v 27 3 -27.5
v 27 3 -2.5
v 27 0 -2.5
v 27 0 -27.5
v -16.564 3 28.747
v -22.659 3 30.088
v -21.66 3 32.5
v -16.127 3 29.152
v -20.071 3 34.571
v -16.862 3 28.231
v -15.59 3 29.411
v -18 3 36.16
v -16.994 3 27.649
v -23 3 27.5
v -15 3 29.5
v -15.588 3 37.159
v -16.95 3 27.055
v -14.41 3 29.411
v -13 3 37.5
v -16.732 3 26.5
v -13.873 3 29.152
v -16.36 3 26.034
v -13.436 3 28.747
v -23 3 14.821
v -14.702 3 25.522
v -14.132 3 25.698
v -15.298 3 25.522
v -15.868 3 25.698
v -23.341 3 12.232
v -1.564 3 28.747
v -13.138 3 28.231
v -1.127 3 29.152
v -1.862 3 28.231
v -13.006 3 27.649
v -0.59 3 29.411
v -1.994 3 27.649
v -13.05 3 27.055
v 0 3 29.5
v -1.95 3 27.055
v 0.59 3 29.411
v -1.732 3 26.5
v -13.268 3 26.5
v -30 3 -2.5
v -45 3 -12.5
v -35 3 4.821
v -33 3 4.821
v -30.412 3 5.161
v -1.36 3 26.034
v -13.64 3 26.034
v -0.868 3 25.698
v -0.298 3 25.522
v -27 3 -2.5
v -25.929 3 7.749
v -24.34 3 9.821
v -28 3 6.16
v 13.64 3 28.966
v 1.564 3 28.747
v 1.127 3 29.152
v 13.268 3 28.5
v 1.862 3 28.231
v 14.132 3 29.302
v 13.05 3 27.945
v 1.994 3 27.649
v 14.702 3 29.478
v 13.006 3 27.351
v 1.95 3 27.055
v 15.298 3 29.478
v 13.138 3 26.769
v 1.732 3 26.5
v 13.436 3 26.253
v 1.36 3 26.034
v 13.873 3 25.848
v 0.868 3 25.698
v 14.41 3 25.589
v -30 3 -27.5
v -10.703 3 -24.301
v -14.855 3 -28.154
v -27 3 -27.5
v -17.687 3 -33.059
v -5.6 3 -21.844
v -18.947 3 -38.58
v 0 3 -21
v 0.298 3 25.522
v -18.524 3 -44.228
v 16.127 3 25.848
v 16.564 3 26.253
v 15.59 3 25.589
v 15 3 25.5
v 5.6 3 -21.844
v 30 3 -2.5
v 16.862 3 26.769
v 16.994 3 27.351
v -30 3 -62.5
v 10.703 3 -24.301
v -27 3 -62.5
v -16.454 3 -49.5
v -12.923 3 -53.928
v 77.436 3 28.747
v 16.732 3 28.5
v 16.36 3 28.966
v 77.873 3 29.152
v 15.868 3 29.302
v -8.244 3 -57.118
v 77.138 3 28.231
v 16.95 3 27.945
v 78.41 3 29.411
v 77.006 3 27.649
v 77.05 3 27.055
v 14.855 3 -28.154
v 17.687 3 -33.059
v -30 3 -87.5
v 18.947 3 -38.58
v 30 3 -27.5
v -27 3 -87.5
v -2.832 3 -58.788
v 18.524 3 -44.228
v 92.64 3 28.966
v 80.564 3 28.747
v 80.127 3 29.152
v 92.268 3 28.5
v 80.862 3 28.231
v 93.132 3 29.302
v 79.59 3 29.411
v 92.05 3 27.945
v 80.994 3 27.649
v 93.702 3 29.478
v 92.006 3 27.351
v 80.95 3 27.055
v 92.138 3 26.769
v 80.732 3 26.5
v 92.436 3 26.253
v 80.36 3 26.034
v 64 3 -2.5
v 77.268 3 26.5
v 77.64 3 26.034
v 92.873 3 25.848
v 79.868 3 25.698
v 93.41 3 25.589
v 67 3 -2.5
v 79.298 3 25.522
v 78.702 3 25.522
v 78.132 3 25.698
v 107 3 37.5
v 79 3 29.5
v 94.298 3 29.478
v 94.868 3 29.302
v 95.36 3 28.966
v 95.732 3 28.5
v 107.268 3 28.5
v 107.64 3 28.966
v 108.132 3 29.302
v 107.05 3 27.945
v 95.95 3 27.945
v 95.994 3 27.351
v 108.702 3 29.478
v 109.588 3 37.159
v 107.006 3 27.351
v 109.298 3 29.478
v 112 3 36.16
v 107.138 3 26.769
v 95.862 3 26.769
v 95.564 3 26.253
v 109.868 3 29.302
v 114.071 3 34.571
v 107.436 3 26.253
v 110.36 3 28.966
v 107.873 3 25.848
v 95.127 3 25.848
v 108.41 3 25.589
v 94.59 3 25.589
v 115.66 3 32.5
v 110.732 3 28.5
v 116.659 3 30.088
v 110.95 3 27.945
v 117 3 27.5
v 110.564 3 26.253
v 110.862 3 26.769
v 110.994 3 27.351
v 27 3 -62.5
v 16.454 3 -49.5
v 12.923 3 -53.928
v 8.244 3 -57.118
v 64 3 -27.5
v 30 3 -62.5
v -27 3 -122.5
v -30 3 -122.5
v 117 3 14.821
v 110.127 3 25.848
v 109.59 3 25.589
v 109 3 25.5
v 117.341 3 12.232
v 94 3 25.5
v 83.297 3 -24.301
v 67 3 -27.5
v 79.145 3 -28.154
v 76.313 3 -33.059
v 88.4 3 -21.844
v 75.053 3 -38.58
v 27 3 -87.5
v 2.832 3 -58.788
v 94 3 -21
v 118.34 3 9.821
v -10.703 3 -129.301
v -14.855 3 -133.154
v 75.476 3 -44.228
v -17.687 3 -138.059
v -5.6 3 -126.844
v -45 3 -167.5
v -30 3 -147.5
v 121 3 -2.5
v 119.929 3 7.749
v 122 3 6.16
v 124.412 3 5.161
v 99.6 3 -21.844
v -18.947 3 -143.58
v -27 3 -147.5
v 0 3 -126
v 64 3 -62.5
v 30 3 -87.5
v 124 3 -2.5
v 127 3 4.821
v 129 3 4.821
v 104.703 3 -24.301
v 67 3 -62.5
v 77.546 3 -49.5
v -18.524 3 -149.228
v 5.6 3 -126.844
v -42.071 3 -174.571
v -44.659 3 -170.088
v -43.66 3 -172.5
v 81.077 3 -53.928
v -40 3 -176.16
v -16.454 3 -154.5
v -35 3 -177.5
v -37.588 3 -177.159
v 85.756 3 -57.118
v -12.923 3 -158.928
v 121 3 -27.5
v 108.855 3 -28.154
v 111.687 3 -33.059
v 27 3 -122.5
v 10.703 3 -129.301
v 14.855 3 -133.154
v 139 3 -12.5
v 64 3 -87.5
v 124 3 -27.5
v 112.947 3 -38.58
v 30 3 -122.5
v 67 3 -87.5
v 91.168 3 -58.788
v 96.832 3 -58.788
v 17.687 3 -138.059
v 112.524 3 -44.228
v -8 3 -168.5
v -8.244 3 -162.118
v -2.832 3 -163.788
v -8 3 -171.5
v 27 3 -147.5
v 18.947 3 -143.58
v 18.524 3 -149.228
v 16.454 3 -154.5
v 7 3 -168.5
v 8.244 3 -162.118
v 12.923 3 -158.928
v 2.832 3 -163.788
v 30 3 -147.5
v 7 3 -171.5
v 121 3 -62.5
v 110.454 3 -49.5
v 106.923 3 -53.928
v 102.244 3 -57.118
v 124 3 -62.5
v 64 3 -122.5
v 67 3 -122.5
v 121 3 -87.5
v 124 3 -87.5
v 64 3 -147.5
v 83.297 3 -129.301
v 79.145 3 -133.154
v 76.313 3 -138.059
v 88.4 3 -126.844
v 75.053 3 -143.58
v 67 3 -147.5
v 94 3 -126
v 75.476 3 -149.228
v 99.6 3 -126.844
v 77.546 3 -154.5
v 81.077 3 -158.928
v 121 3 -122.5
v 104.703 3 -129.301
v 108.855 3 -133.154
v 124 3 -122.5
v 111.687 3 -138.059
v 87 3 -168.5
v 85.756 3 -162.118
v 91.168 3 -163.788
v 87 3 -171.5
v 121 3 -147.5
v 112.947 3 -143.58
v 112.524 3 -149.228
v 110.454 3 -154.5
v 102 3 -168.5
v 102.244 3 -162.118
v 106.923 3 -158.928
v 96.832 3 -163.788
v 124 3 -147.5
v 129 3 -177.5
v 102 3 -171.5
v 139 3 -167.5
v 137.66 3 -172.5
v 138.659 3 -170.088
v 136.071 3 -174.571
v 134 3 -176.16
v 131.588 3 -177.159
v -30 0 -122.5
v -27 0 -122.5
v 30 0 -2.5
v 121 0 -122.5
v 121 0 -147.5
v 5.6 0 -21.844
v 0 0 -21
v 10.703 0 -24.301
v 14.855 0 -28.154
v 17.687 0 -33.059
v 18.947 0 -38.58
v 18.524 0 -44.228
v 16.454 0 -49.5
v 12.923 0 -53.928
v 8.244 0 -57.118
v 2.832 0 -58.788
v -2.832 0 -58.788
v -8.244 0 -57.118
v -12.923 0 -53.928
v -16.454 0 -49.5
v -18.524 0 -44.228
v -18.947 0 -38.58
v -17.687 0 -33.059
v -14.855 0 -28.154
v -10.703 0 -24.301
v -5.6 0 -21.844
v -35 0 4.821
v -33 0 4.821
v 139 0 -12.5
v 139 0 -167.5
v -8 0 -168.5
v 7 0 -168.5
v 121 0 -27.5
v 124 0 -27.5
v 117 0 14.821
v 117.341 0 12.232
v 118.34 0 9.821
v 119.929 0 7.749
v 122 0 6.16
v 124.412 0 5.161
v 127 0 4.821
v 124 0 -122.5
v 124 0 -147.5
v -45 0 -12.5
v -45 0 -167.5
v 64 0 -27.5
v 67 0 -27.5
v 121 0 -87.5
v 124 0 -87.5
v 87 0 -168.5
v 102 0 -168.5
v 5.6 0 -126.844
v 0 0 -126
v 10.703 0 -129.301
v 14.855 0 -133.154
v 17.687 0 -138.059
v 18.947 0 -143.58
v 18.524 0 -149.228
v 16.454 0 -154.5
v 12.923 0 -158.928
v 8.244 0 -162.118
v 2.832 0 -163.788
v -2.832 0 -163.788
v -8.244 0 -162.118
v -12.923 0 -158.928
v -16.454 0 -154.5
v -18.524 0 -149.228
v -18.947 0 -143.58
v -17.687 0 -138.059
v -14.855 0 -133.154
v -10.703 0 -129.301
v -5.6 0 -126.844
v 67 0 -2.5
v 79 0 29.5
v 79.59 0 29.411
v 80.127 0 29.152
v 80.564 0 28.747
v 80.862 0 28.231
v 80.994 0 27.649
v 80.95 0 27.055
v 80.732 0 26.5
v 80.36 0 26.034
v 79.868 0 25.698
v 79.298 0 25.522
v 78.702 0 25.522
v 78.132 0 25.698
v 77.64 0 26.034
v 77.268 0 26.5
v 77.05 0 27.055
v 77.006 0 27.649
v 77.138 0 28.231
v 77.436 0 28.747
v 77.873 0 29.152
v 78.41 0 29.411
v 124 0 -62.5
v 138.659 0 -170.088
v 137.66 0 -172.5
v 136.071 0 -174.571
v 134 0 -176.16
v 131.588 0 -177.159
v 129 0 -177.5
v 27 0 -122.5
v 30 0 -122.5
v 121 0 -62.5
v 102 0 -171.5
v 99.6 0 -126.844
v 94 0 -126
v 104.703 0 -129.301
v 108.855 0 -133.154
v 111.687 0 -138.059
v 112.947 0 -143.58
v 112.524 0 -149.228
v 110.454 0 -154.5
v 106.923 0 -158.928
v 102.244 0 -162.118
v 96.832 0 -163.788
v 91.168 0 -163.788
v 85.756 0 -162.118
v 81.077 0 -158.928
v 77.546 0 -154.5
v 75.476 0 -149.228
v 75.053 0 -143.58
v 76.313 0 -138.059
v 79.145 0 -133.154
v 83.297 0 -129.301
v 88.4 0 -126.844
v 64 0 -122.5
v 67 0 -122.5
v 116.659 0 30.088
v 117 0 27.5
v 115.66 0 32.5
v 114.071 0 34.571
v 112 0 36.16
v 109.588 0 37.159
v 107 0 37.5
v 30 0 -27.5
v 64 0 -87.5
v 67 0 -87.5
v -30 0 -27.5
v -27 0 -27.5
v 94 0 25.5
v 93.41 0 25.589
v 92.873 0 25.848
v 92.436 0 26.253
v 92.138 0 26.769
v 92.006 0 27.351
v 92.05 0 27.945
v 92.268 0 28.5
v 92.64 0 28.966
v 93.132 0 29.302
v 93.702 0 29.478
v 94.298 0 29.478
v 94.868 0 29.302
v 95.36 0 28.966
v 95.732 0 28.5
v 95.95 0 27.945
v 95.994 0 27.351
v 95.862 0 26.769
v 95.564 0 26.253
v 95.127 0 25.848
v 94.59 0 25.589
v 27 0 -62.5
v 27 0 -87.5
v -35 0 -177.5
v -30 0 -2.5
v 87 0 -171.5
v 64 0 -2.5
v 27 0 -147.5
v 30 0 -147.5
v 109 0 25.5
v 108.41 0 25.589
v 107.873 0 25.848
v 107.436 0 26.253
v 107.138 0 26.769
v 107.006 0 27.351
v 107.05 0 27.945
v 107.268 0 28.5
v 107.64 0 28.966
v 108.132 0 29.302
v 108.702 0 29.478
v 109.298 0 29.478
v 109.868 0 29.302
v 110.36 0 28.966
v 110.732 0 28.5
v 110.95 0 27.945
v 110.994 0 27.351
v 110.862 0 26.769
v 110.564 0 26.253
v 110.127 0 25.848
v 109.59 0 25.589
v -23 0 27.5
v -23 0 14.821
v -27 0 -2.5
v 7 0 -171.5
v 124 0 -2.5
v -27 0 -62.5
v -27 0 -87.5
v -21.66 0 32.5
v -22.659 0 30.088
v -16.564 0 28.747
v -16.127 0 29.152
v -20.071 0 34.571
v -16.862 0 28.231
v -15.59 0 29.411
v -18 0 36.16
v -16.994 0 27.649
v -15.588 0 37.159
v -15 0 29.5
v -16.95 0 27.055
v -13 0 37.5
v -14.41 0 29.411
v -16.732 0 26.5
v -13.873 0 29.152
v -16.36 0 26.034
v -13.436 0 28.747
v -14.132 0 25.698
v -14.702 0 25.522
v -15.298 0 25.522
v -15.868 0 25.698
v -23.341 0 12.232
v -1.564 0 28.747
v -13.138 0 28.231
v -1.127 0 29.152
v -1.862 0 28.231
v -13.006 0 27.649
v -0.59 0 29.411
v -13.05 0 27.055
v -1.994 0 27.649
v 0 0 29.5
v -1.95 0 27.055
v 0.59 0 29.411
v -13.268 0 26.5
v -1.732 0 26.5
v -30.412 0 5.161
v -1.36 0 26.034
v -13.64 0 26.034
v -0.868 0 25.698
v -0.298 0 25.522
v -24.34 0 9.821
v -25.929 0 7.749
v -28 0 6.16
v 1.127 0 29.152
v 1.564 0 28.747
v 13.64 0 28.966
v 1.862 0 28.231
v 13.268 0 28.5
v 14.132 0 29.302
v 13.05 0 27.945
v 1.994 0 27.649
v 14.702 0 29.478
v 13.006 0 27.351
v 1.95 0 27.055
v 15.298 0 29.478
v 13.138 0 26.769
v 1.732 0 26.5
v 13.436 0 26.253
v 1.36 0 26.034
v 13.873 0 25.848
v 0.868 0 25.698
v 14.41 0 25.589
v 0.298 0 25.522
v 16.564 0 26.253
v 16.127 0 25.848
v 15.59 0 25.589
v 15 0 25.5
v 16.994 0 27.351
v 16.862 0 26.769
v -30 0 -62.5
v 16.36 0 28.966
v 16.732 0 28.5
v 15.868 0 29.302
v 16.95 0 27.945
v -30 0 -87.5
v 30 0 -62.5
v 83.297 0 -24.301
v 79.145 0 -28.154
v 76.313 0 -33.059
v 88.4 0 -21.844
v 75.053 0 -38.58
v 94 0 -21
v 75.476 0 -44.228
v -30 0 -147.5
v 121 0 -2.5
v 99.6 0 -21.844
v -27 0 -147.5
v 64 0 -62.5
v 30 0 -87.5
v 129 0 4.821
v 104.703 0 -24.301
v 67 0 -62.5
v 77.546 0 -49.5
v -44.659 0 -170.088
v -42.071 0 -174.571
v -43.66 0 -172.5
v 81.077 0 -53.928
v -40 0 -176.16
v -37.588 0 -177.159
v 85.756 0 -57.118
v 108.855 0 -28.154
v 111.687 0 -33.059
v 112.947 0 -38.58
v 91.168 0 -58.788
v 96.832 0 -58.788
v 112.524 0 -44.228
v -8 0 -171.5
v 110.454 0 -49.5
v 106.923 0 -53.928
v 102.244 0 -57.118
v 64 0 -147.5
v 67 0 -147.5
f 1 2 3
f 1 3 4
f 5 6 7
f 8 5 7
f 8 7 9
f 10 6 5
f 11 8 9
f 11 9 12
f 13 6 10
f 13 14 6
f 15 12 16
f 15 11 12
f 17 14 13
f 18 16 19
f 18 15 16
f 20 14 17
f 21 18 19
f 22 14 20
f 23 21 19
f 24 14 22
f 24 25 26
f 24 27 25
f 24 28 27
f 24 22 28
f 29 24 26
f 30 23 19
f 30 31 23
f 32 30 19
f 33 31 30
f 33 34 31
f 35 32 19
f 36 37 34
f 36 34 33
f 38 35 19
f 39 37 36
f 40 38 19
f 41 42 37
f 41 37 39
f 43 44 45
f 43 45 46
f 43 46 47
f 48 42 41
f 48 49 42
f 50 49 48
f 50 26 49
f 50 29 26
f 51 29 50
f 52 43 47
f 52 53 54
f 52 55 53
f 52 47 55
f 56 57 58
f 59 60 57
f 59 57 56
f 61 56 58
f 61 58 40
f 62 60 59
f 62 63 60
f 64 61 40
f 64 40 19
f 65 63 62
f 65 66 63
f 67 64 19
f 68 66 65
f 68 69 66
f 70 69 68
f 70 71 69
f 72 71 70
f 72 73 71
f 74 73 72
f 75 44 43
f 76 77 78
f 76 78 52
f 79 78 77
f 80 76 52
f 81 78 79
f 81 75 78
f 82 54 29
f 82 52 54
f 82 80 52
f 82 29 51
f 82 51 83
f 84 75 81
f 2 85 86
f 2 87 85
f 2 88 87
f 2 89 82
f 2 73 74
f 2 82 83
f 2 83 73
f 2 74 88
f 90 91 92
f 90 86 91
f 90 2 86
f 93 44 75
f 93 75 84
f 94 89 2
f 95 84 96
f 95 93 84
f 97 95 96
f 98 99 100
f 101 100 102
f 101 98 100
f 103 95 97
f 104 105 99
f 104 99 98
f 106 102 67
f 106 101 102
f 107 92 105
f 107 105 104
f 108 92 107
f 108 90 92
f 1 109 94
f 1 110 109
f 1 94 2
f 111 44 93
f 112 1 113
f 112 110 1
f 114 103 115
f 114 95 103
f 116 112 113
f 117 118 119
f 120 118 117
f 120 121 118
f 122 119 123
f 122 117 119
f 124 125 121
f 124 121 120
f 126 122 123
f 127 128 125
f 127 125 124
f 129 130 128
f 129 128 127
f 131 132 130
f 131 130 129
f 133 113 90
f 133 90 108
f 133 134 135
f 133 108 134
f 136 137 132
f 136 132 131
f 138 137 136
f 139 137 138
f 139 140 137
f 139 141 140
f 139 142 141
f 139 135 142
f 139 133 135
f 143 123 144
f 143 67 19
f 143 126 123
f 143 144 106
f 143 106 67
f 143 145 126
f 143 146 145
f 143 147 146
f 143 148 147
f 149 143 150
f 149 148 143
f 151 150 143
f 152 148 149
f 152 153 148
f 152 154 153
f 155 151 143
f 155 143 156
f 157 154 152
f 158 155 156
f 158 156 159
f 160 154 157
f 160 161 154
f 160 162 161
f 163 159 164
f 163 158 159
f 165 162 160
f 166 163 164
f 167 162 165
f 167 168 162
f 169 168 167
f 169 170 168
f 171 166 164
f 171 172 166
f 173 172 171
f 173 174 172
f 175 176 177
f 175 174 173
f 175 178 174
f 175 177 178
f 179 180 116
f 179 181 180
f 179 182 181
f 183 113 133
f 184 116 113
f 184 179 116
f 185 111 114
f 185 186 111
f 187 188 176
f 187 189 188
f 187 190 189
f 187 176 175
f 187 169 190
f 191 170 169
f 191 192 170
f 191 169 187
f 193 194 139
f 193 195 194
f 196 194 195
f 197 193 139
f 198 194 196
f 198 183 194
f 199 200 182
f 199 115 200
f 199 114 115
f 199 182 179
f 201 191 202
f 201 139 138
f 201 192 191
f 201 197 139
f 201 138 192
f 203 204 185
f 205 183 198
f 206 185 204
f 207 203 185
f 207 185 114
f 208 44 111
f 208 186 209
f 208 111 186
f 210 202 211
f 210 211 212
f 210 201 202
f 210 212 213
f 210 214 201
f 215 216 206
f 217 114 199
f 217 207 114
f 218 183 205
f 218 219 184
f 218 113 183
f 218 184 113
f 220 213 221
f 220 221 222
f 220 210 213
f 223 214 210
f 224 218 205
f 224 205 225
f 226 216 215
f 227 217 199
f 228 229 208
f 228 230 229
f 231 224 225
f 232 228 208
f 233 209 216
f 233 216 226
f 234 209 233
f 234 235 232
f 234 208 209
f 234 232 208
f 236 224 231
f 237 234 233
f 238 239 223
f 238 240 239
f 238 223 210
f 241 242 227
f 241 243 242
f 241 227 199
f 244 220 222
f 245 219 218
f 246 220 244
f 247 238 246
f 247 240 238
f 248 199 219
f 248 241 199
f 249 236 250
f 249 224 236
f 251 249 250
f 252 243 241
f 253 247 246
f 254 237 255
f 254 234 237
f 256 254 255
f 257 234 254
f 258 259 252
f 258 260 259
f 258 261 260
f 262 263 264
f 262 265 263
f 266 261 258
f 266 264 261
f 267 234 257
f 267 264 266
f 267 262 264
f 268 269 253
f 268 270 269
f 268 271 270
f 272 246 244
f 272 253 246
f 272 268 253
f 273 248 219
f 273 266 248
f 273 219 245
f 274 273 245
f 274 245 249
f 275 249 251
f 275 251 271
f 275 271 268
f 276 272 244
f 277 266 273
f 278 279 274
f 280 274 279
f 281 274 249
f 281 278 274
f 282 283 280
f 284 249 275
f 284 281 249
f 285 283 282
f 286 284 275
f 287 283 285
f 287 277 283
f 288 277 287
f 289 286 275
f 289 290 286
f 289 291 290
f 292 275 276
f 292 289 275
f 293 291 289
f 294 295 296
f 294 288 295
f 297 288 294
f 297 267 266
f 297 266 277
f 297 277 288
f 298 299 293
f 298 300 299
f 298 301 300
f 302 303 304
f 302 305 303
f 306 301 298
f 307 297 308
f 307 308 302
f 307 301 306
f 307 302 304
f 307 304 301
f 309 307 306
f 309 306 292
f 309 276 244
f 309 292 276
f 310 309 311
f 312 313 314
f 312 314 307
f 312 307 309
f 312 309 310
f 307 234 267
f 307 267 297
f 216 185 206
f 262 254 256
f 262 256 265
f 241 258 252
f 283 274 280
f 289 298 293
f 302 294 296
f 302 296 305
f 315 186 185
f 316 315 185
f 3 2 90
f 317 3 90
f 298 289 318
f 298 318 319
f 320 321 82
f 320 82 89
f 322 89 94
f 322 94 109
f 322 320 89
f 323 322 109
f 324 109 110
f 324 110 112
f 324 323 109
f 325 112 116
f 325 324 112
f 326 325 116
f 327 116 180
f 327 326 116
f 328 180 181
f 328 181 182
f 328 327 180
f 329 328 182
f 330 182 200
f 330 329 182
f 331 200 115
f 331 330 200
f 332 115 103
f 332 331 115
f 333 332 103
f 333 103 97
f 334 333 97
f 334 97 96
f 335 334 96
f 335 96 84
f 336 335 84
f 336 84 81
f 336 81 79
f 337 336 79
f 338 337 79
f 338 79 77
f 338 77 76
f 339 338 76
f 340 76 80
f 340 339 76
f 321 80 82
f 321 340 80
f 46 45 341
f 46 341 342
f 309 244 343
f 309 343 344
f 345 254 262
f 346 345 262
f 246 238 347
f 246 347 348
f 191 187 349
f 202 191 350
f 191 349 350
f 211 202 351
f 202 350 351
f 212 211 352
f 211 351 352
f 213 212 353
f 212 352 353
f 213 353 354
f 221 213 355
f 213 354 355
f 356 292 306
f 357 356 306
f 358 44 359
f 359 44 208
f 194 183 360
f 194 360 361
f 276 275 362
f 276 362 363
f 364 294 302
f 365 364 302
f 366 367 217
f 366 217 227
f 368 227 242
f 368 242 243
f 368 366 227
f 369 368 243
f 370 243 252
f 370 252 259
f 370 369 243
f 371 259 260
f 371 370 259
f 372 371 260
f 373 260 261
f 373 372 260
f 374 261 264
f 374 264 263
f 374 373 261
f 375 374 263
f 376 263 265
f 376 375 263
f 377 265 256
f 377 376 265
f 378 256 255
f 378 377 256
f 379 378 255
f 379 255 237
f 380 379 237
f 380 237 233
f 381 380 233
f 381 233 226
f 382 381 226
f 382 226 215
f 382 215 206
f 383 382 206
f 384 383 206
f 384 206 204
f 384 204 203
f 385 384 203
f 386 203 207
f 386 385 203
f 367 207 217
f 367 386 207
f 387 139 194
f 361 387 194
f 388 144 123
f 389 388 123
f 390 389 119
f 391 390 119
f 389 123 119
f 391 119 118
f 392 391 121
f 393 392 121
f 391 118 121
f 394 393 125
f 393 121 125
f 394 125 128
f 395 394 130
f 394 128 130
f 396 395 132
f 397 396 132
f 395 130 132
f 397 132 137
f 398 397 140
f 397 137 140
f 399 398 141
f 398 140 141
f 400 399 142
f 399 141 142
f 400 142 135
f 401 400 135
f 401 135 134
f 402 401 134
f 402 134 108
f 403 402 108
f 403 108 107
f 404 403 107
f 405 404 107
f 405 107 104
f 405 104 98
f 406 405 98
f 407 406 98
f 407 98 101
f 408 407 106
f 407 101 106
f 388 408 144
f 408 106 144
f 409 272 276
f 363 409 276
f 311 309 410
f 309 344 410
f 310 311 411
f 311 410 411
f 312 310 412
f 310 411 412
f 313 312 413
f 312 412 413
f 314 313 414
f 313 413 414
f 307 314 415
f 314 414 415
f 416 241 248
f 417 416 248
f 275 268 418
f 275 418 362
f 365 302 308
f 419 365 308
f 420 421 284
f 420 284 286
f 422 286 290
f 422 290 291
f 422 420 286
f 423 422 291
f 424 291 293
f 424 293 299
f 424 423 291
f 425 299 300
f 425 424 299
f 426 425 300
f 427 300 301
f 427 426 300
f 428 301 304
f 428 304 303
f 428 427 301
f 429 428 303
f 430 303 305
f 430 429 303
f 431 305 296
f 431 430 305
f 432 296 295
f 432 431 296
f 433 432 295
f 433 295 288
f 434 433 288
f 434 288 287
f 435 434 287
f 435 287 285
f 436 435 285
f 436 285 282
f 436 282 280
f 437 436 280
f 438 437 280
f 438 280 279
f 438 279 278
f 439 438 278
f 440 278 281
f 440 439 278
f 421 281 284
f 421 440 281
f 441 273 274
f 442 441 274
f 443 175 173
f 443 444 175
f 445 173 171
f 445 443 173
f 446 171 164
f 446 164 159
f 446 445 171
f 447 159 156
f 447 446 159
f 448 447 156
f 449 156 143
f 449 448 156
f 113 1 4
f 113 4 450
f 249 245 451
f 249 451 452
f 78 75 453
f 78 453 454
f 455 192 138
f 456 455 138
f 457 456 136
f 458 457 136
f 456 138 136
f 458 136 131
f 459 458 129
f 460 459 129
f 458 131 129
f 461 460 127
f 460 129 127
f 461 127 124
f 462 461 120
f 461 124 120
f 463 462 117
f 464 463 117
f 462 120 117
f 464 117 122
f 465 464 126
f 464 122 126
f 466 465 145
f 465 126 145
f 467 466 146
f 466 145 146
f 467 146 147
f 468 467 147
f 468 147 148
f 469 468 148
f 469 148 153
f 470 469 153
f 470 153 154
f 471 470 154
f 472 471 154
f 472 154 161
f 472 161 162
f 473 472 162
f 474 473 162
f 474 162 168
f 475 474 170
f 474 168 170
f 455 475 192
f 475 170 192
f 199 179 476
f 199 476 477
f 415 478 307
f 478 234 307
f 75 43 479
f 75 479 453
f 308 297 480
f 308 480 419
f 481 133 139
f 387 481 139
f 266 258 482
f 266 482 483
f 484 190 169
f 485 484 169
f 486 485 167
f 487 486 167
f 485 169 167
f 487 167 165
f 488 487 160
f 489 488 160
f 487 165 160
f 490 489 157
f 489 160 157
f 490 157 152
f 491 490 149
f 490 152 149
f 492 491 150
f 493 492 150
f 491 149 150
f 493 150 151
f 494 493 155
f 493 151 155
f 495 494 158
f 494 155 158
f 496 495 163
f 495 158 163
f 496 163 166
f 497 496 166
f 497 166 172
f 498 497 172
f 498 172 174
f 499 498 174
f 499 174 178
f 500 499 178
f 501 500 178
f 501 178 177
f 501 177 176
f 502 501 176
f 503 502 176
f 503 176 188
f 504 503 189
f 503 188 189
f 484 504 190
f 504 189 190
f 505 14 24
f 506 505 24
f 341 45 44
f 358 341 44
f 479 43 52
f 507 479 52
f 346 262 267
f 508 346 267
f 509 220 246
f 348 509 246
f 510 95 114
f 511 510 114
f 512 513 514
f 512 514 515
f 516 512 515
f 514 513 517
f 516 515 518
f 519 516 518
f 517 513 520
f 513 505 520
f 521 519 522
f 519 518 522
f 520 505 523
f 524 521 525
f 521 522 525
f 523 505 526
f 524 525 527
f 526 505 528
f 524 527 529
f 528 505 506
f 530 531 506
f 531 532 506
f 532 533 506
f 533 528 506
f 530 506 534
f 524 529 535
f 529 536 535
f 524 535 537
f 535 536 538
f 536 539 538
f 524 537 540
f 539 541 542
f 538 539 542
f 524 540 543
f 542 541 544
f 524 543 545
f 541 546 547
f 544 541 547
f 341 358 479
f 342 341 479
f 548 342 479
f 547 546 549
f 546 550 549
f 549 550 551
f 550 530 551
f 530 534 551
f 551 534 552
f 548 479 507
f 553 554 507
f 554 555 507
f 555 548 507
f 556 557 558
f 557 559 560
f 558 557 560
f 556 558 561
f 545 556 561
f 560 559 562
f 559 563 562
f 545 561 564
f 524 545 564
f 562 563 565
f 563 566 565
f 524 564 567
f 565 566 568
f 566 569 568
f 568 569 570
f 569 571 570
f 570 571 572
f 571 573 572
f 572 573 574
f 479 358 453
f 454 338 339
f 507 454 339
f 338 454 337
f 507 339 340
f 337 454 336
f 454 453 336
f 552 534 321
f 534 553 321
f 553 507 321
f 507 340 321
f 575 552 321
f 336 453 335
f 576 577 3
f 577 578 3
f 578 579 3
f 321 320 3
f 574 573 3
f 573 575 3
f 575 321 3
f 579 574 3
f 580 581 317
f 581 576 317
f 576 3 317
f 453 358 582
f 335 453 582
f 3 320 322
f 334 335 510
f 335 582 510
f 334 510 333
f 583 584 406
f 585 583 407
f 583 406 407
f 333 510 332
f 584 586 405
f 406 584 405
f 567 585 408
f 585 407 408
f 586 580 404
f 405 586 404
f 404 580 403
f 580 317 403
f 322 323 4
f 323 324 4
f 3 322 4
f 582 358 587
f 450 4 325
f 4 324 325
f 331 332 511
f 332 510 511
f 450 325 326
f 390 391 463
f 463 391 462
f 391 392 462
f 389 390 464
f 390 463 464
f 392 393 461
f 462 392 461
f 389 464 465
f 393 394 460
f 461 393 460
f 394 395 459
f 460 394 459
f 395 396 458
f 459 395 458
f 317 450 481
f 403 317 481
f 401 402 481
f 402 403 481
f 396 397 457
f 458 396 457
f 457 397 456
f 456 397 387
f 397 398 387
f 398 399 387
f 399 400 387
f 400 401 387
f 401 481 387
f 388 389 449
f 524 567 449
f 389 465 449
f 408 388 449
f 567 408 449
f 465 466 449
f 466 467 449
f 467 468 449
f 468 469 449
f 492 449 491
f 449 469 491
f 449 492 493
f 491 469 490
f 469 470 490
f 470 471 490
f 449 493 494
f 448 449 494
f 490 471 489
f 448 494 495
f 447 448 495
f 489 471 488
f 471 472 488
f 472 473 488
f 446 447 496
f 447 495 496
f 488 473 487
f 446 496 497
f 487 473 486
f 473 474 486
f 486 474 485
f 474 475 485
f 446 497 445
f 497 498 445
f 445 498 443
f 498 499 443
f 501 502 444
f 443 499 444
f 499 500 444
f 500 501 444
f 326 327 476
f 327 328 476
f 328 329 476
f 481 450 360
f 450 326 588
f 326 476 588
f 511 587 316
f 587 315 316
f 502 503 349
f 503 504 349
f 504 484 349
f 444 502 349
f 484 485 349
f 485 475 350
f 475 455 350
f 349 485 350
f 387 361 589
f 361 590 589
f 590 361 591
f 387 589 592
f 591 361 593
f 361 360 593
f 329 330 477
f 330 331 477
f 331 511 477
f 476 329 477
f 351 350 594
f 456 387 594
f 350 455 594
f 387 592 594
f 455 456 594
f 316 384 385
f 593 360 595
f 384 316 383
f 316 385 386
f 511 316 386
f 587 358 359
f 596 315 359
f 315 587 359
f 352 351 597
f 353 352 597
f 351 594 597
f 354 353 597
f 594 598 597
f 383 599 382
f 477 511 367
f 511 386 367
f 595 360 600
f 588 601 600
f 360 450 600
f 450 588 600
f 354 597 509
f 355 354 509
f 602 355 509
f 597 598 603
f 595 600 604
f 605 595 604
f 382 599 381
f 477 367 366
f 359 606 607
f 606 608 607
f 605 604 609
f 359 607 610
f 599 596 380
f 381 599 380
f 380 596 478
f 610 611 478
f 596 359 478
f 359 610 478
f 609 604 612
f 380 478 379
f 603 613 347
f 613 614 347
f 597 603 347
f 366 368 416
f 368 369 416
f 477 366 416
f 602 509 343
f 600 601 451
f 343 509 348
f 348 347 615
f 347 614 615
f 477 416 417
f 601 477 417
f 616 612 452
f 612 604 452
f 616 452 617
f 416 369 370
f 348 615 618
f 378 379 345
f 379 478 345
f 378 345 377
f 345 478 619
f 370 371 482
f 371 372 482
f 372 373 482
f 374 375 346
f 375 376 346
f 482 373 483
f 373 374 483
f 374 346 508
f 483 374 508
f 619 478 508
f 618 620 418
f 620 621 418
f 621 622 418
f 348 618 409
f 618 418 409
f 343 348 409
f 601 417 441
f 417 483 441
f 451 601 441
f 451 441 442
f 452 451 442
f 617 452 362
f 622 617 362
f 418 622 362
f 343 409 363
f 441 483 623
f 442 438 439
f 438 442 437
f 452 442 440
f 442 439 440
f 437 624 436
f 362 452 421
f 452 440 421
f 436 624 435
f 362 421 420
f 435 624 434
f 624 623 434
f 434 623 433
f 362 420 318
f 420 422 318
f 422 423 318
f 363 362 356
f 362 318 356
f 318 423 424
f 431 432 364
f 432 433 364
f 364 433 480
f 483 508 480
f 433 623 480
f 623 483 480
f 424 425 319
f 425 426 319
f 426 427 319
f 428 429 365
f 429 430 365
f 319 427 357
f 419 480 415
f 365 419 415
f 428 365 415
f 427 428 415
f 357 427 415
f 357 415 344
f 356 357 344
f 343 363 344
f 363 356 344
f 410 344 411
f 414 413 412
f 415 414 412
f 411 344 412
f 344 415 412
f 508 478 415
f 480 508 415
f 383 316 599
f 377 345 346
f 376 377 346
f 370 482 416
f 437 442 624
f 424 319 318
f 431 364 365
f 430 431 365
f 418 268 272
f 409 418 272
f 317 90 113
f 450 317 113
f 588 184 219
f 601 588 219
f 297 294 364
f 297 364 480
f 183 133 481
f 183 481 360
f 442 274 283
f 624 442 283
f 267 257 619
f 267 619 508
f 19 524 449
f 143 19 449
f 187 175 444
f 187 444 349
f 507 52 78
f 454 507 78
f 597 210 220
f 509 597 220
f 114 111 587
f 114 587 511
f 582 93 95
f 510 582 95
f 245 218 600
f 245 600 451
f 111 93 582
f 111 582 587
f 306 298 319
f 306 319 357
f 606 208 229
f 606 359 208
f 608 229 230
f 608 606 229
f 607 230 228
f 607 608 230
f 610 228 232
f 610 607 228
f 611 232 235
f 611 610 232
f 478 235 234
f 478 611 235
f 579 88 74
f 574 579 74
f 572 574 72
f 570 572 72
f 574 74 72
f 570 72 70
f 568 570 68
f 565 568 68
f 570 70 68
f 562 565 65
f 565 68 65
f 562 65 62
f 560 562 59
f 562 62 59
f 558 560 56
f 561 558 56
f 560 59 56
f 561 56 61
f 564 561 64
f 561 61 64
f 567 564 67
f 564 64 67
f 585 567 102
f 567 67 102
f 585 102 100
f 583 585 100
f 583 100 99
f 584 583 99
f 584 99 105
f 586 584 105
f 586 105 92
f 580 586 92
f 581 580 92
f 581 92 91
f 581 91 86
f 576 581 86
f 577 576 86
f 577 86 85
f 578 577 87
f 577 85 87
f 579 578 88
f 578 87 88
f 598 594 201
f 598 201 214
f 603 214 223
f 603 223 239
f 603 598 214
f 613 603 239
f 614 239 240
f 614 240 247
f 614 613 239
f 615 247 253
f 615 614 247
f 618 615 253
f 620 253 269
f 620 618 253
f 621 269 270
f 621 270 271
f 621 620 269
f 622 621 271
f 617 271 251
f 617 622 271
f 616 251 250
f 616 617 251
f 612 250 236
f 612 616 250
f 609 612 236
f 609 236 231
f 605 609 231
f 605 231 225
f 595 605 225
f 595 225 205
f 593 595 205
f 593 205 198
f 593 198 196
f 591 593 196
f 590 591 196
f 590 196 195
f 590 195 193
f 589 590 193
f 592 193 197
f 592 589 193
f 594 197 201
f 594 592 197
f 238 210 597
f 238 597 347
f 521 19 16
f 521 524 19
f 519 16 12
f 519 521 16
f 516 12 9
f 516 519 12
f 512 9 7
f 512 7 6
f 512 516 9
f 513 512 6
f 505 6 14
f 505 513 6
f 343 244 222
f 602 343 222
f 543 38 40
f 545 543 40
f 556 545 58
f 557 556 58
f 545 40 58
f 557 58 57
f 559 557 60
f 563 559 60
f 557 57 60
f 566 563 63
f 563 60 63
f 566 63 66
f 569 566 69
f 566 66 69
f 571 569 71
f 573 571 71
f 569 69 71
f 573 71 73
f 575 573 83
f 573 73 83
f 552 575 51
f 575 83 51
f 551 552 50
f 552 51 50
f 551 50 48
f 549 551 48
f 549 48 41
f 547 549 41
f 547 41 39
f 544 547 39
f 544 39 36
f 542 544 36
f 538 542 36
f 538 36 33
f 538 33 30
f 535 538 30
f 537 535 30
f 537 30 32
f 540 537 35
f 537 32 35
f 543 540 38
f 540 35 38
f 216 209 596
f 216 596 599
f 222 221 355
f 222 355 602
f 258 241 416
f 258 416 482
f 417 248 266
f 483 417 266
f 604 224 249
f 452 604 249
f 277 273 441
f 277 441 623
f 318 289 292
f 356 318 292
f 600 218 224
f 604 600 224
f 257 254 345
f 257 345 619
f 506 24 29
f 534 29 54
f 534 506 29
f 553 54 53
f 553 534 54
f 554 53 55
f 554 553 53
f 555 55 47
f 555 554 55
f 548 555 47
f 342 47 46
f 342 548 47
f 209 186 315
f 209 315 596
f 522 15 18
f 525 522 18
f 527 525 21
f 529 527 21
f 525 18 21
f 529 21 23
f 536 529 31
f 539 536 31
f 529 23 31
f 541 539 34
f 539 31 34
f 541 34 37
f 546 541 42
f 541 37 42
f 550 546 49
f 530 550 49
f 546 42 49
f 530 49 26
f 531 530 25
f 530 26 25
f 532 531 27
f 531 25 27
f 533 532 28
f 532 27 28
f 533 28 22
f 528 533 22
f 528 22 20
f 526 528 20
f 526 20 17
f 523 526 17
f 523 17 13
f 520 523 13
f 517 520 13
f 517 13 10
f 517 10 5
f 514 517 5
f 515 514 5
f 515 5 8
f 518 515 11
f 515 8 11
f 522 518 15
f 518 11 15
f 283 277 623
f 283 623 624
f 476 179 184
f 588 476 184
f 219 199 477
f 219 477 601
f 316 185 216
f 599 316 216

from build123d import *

# Parameters (mm, degrees)
SKETCH_1_W          = 164
SKETCH_1_H          = 215
SKETCH_1_R          = 19
EXTRUDE_1_DEPTH     = 3
SKETCH_2_R          = 2
CUT_EXTRUDE_1_DEPTH = 3
SKETCH_3_W          = 3
SKETCH_3_H          = 25
CUT_EXTRUDE_2_DEPTH = 10
SKETCH_4_W          = 15
SKETCH_4_H          = 3
CUT_EXTRUDE_3_DEPTH = 10
SKETCH_6_W          = 10
SKETCH_6_H          = 190
EXTRUDE_2_DEPTH     = 3
CHAMFER_1_SIZE      = 25
CHAMFER_1_SIZE_2    = 14.43375673
FILLET_4_R          = 10
SKETCH_7_W          = 20
SKETCH_7_H          = 32.679491924
CUT_EXTRUDE_4_DEPTH = 10
FILLET_5_R          = 10
FILLET_6_R          = 10


with BuildPart() as part:
    # 草图1 → 凸台-拉伸1 (new body)
    with BuildSketch(Plane(origin=(0, 0, 0), x_dir=(1, 0, 0), z_dir=(0, 1, 0))):
        with Locations((47, 70)):
            Rectangle(SKETCH_1_W, SKETCH_1_H)
        with Locations(Location((94, 40, 0), (0, 0, 270))):
            Circle(SKETCH_1_R, mode=Mode.SUBTRACT)
        with Locations(Location((0, 40, 0), (0, 0, 270))):
            Circle(SKETCH_1_R, mode=Mode.SUBTRACT)
        with Locations(Location((0, 145, 0), (0, 0, 270))):
            Circle(SKETCH_1_R, mode=Mode.SUBTRACT)
        with Locations(Location((94, 145, 0), (0, 0, 270))):
            Circle(SKETCH_1_R, mode=Mode.SUBTRACT)
    extrude(amount=EXTRUDE_1_DEPTH)

    # 草图2 → 切除-拉伸1 (cut)
    with BuildSketch(Plane(origin=(0, 3, 0), x_dir=(1, 0, 0), z_dir=(0, 1, 0))):
        with Locations(Location((0, -27.5, 0), (0, 0, 270))):
            Circle(SKETCH_2_R)
        with Locations(Location((-15, -27.5, 0), (0, 0, 270))):
            Circle(SKETCH_2_R)
        with Locations(Location((15, -27.5, 0), (0, 0, 90))):
            Circle(SKETCH_2_R)
        with Locations(Location((79, -27.5, 0), (0, 0, 270))):
            Circle(SKETCH_2_R)
        with Locations(Location((109, -27.5, 0), (0, 0, 90))):
            Circle(SKETCH_2_R)
        with Locations(Location((94, -27.5, 0), (0, 0, 90))):
            Circle(SKETCH_2_R)
    extrude(amount=-CUT_EXTRUDE_1_DEPTH, mode=Mode.SUBTRACT)

    # 草图3 → 切除-拉伸2 (cut)
    with BuildSketch(Plane(origin=(0, 3, 0), x_dir=(1, 0, 0), z_dir=(0, 1, 0))):
        with Locations((28.5, 135)):
            Rectangle(SKETCH_3_W, SKETCH_3_H)
        with Locations((65.5, 135)):
            Rectangle(SKETCH_3_W, SKETCH_3_H)
        with Locations((28.5, 75)):
            Rectangle(SKETCH_3_W, SKETCH_3_H)
        with Locations((65.5, 75)):
            Rectangle(SKETCH_3_W, SKETCH_3_H)
        with Locations((28.5, 15)):
            Rectangle(SKETCH_3_W, SKETCH_3_H)
        with Locations((65.5, 15)):
            Rectangle(SKETCH_3_W, SKETCH_3_H)
        with Locations((-28.5, 15)):
            Rectangle(SKETCH_3_W, SKETCH_3_H)
        with Locations((-28.5, 75)):
            Rectangle(SKETCH_3_W, SKETCH_3_H)
        with Locations((-28.5, 135)):
            Rectangle(SKETCH_3_W, SKETCH_3_H)
        with Locations((122.5, 135)):
            Rectangle(SKETCH_3_W, SKETCH_3_H)
        with Locations((122.5, 75)):
            Rectangle(SKETCH_3_W, SKETCH_3_H)
        with Locations((122.5, 15)):
            Rectangle(SKETCH_3_W, SKETCH_3_H)
    extrude(amount=-CUT_EXTRUDE_2_DEPTH, mode=Mode.SUBTRACT)

    # 草图4 → 切除-拉伸3 (cut)
    with BuildSketch(Plane(origin=(0, 3, 0), x_dir=(1, 0, 0), z_dir=(0, 1, 0))):
        with Locations((-0.5, 170)):
            Rectangle(SKETCH_4_W, SKETCH_4_H)
        with Locations((94.5, 170)):
            Rectangle(SKETCH_4_W, SKETCH_4_H)
    extrude(amount=-CUT_EXTRUDE_3_DEPTH, mode=Mode.SUBTRACT)

    # 草图6 → 凸台-拉伸2 (add)
    with BuildSketch(Plane(origin=(0, 3, 0), x_dir=(1, 0, 0), z_dir=(0, 1, 0))):
        with Locations((-40, 82.5)):
            Rectangle(SKETCH_6_W, SKETCH_6_H)
        with Locations((134, 82.5)):
            Rectangle(SKETCH_6_W, SKETCH_6_H)
    extrude(amount=-EXTRUDE_2_DEPTH)

    # 倒角1
    # the kernel refuses this chamfer: 25, 14.43375673 mm, written as the material it takes off along each edge
    with BuildSketch(Plane(origin=(139, 67.677143866, 12.5), x_dir=(0.019326765612700705, 0, -0.9998132206222079), z_dir=(0, -1, 0))) as chamfer_1_piece_1_section:
        Polygon((CHAMFER_1_SIZE * 0.999813220622, -CHAMFER_1_SIZE * 0.0193267656127), (-CHAMFER_1_SIZE_2 * 0.0193267656124, -CHAMFER_1_SIZE_2 * 0.999813220604), (0, 0), align=None)
    chamfer_1_piece_1 = extrude(amount=132.354287732, mode=Mode.PRIVATE)
    chamfer_1_piece_1 = split(chamfer_1_piece_1, bisect_by=Plane(origin=(129, 1.5, 3.344472452), z_dir=(1, 0, 0)), keep=Keep.TOP, mode=Mode.PRIVATE)
    add(chamfer_1_piece_1, mode=Mode.SUBTRACT)
    with BuildSketch(Plane(origin=(-45, 67.677143866, 12.5), x_dir=(0.9983227437537926, 0, 0.057893862402670776), z_dir=(0, -1, 0))) as chamfer_1_piece_2_section:
        Polygon((CHAMFER_1_SIZE_2 * 0.998322743736, -CHAMFER_1_SIZE_2 * 0.0578938624016), (-CHAMFER_1_SIZE * 0.0578938624027, -CHAMFER_1_SIZE * 0.998322743754), (0, 0), align=None)
    chamfer_1_piece_2 = extrude(amount=132.354287732, mode=Mode.PRIVATE)
    chamfer_1_piece_2 = split(chamfer_1_piece_2, bisect_by=Plane(origin=(-35, 1.5, 3.344472452), z_dir=(-1, 0, 0)), keep=Keep.TOP, mode=Mode.PRIVATE)
    add(chamfer_1_piece_2, mode=Mode.SUBTRACT)

    # 圆角4
    fillet_4_edges = [part.edges().sort_by_distance(p)[0] for p in [
        (-35, 1.5, 37.5),
        (129, 1.5, 37.5),
        (-45, 1.5, -177.5),
        (139, 1.5, -177.5),
    ]]
    fillet(fillet_4_edges, radius=FILLET_4_R)

    # 草图7 → 切除-拉伸4 (cut)
    with BuildSketch(Plane(origin=(0, 3, 0), x_dir=(1, 0, 0), z_dir=(0, 1, 0))):
        with Locations((-33, -21.160254038)):
            Rectangle(SKETCH_7_W, SKETCH_7_H)
        with Locations((127, -21.160254038)):
            Rectangle(SKETCH_7_W, SKETCH_7_H)
    extrude(amount=-CUT_EXTRUDE_4_DEPTH, mode=Mode.SUBTRACT)

    # 圆角5
    fillet_5_edges = [part.edges().sort_by_distance(p)[0] for p in [
        (-23, 1.5, 37.5),
        (117, 1.5, 37.5),
    ]]
    fillet(fillet_5_edges, radius=FILLET_5_R)

    # 圆角6
    fillet_6_edges = [part.edges().sort_by_distance(p)[0] for p in [
        (-23, 1.5, 4.820508076),
        (117, 1.5, 4.820508076),
    ]]
    fillet(fillet_6_edges, radius=FILLET_6_R)


solid = part.part
